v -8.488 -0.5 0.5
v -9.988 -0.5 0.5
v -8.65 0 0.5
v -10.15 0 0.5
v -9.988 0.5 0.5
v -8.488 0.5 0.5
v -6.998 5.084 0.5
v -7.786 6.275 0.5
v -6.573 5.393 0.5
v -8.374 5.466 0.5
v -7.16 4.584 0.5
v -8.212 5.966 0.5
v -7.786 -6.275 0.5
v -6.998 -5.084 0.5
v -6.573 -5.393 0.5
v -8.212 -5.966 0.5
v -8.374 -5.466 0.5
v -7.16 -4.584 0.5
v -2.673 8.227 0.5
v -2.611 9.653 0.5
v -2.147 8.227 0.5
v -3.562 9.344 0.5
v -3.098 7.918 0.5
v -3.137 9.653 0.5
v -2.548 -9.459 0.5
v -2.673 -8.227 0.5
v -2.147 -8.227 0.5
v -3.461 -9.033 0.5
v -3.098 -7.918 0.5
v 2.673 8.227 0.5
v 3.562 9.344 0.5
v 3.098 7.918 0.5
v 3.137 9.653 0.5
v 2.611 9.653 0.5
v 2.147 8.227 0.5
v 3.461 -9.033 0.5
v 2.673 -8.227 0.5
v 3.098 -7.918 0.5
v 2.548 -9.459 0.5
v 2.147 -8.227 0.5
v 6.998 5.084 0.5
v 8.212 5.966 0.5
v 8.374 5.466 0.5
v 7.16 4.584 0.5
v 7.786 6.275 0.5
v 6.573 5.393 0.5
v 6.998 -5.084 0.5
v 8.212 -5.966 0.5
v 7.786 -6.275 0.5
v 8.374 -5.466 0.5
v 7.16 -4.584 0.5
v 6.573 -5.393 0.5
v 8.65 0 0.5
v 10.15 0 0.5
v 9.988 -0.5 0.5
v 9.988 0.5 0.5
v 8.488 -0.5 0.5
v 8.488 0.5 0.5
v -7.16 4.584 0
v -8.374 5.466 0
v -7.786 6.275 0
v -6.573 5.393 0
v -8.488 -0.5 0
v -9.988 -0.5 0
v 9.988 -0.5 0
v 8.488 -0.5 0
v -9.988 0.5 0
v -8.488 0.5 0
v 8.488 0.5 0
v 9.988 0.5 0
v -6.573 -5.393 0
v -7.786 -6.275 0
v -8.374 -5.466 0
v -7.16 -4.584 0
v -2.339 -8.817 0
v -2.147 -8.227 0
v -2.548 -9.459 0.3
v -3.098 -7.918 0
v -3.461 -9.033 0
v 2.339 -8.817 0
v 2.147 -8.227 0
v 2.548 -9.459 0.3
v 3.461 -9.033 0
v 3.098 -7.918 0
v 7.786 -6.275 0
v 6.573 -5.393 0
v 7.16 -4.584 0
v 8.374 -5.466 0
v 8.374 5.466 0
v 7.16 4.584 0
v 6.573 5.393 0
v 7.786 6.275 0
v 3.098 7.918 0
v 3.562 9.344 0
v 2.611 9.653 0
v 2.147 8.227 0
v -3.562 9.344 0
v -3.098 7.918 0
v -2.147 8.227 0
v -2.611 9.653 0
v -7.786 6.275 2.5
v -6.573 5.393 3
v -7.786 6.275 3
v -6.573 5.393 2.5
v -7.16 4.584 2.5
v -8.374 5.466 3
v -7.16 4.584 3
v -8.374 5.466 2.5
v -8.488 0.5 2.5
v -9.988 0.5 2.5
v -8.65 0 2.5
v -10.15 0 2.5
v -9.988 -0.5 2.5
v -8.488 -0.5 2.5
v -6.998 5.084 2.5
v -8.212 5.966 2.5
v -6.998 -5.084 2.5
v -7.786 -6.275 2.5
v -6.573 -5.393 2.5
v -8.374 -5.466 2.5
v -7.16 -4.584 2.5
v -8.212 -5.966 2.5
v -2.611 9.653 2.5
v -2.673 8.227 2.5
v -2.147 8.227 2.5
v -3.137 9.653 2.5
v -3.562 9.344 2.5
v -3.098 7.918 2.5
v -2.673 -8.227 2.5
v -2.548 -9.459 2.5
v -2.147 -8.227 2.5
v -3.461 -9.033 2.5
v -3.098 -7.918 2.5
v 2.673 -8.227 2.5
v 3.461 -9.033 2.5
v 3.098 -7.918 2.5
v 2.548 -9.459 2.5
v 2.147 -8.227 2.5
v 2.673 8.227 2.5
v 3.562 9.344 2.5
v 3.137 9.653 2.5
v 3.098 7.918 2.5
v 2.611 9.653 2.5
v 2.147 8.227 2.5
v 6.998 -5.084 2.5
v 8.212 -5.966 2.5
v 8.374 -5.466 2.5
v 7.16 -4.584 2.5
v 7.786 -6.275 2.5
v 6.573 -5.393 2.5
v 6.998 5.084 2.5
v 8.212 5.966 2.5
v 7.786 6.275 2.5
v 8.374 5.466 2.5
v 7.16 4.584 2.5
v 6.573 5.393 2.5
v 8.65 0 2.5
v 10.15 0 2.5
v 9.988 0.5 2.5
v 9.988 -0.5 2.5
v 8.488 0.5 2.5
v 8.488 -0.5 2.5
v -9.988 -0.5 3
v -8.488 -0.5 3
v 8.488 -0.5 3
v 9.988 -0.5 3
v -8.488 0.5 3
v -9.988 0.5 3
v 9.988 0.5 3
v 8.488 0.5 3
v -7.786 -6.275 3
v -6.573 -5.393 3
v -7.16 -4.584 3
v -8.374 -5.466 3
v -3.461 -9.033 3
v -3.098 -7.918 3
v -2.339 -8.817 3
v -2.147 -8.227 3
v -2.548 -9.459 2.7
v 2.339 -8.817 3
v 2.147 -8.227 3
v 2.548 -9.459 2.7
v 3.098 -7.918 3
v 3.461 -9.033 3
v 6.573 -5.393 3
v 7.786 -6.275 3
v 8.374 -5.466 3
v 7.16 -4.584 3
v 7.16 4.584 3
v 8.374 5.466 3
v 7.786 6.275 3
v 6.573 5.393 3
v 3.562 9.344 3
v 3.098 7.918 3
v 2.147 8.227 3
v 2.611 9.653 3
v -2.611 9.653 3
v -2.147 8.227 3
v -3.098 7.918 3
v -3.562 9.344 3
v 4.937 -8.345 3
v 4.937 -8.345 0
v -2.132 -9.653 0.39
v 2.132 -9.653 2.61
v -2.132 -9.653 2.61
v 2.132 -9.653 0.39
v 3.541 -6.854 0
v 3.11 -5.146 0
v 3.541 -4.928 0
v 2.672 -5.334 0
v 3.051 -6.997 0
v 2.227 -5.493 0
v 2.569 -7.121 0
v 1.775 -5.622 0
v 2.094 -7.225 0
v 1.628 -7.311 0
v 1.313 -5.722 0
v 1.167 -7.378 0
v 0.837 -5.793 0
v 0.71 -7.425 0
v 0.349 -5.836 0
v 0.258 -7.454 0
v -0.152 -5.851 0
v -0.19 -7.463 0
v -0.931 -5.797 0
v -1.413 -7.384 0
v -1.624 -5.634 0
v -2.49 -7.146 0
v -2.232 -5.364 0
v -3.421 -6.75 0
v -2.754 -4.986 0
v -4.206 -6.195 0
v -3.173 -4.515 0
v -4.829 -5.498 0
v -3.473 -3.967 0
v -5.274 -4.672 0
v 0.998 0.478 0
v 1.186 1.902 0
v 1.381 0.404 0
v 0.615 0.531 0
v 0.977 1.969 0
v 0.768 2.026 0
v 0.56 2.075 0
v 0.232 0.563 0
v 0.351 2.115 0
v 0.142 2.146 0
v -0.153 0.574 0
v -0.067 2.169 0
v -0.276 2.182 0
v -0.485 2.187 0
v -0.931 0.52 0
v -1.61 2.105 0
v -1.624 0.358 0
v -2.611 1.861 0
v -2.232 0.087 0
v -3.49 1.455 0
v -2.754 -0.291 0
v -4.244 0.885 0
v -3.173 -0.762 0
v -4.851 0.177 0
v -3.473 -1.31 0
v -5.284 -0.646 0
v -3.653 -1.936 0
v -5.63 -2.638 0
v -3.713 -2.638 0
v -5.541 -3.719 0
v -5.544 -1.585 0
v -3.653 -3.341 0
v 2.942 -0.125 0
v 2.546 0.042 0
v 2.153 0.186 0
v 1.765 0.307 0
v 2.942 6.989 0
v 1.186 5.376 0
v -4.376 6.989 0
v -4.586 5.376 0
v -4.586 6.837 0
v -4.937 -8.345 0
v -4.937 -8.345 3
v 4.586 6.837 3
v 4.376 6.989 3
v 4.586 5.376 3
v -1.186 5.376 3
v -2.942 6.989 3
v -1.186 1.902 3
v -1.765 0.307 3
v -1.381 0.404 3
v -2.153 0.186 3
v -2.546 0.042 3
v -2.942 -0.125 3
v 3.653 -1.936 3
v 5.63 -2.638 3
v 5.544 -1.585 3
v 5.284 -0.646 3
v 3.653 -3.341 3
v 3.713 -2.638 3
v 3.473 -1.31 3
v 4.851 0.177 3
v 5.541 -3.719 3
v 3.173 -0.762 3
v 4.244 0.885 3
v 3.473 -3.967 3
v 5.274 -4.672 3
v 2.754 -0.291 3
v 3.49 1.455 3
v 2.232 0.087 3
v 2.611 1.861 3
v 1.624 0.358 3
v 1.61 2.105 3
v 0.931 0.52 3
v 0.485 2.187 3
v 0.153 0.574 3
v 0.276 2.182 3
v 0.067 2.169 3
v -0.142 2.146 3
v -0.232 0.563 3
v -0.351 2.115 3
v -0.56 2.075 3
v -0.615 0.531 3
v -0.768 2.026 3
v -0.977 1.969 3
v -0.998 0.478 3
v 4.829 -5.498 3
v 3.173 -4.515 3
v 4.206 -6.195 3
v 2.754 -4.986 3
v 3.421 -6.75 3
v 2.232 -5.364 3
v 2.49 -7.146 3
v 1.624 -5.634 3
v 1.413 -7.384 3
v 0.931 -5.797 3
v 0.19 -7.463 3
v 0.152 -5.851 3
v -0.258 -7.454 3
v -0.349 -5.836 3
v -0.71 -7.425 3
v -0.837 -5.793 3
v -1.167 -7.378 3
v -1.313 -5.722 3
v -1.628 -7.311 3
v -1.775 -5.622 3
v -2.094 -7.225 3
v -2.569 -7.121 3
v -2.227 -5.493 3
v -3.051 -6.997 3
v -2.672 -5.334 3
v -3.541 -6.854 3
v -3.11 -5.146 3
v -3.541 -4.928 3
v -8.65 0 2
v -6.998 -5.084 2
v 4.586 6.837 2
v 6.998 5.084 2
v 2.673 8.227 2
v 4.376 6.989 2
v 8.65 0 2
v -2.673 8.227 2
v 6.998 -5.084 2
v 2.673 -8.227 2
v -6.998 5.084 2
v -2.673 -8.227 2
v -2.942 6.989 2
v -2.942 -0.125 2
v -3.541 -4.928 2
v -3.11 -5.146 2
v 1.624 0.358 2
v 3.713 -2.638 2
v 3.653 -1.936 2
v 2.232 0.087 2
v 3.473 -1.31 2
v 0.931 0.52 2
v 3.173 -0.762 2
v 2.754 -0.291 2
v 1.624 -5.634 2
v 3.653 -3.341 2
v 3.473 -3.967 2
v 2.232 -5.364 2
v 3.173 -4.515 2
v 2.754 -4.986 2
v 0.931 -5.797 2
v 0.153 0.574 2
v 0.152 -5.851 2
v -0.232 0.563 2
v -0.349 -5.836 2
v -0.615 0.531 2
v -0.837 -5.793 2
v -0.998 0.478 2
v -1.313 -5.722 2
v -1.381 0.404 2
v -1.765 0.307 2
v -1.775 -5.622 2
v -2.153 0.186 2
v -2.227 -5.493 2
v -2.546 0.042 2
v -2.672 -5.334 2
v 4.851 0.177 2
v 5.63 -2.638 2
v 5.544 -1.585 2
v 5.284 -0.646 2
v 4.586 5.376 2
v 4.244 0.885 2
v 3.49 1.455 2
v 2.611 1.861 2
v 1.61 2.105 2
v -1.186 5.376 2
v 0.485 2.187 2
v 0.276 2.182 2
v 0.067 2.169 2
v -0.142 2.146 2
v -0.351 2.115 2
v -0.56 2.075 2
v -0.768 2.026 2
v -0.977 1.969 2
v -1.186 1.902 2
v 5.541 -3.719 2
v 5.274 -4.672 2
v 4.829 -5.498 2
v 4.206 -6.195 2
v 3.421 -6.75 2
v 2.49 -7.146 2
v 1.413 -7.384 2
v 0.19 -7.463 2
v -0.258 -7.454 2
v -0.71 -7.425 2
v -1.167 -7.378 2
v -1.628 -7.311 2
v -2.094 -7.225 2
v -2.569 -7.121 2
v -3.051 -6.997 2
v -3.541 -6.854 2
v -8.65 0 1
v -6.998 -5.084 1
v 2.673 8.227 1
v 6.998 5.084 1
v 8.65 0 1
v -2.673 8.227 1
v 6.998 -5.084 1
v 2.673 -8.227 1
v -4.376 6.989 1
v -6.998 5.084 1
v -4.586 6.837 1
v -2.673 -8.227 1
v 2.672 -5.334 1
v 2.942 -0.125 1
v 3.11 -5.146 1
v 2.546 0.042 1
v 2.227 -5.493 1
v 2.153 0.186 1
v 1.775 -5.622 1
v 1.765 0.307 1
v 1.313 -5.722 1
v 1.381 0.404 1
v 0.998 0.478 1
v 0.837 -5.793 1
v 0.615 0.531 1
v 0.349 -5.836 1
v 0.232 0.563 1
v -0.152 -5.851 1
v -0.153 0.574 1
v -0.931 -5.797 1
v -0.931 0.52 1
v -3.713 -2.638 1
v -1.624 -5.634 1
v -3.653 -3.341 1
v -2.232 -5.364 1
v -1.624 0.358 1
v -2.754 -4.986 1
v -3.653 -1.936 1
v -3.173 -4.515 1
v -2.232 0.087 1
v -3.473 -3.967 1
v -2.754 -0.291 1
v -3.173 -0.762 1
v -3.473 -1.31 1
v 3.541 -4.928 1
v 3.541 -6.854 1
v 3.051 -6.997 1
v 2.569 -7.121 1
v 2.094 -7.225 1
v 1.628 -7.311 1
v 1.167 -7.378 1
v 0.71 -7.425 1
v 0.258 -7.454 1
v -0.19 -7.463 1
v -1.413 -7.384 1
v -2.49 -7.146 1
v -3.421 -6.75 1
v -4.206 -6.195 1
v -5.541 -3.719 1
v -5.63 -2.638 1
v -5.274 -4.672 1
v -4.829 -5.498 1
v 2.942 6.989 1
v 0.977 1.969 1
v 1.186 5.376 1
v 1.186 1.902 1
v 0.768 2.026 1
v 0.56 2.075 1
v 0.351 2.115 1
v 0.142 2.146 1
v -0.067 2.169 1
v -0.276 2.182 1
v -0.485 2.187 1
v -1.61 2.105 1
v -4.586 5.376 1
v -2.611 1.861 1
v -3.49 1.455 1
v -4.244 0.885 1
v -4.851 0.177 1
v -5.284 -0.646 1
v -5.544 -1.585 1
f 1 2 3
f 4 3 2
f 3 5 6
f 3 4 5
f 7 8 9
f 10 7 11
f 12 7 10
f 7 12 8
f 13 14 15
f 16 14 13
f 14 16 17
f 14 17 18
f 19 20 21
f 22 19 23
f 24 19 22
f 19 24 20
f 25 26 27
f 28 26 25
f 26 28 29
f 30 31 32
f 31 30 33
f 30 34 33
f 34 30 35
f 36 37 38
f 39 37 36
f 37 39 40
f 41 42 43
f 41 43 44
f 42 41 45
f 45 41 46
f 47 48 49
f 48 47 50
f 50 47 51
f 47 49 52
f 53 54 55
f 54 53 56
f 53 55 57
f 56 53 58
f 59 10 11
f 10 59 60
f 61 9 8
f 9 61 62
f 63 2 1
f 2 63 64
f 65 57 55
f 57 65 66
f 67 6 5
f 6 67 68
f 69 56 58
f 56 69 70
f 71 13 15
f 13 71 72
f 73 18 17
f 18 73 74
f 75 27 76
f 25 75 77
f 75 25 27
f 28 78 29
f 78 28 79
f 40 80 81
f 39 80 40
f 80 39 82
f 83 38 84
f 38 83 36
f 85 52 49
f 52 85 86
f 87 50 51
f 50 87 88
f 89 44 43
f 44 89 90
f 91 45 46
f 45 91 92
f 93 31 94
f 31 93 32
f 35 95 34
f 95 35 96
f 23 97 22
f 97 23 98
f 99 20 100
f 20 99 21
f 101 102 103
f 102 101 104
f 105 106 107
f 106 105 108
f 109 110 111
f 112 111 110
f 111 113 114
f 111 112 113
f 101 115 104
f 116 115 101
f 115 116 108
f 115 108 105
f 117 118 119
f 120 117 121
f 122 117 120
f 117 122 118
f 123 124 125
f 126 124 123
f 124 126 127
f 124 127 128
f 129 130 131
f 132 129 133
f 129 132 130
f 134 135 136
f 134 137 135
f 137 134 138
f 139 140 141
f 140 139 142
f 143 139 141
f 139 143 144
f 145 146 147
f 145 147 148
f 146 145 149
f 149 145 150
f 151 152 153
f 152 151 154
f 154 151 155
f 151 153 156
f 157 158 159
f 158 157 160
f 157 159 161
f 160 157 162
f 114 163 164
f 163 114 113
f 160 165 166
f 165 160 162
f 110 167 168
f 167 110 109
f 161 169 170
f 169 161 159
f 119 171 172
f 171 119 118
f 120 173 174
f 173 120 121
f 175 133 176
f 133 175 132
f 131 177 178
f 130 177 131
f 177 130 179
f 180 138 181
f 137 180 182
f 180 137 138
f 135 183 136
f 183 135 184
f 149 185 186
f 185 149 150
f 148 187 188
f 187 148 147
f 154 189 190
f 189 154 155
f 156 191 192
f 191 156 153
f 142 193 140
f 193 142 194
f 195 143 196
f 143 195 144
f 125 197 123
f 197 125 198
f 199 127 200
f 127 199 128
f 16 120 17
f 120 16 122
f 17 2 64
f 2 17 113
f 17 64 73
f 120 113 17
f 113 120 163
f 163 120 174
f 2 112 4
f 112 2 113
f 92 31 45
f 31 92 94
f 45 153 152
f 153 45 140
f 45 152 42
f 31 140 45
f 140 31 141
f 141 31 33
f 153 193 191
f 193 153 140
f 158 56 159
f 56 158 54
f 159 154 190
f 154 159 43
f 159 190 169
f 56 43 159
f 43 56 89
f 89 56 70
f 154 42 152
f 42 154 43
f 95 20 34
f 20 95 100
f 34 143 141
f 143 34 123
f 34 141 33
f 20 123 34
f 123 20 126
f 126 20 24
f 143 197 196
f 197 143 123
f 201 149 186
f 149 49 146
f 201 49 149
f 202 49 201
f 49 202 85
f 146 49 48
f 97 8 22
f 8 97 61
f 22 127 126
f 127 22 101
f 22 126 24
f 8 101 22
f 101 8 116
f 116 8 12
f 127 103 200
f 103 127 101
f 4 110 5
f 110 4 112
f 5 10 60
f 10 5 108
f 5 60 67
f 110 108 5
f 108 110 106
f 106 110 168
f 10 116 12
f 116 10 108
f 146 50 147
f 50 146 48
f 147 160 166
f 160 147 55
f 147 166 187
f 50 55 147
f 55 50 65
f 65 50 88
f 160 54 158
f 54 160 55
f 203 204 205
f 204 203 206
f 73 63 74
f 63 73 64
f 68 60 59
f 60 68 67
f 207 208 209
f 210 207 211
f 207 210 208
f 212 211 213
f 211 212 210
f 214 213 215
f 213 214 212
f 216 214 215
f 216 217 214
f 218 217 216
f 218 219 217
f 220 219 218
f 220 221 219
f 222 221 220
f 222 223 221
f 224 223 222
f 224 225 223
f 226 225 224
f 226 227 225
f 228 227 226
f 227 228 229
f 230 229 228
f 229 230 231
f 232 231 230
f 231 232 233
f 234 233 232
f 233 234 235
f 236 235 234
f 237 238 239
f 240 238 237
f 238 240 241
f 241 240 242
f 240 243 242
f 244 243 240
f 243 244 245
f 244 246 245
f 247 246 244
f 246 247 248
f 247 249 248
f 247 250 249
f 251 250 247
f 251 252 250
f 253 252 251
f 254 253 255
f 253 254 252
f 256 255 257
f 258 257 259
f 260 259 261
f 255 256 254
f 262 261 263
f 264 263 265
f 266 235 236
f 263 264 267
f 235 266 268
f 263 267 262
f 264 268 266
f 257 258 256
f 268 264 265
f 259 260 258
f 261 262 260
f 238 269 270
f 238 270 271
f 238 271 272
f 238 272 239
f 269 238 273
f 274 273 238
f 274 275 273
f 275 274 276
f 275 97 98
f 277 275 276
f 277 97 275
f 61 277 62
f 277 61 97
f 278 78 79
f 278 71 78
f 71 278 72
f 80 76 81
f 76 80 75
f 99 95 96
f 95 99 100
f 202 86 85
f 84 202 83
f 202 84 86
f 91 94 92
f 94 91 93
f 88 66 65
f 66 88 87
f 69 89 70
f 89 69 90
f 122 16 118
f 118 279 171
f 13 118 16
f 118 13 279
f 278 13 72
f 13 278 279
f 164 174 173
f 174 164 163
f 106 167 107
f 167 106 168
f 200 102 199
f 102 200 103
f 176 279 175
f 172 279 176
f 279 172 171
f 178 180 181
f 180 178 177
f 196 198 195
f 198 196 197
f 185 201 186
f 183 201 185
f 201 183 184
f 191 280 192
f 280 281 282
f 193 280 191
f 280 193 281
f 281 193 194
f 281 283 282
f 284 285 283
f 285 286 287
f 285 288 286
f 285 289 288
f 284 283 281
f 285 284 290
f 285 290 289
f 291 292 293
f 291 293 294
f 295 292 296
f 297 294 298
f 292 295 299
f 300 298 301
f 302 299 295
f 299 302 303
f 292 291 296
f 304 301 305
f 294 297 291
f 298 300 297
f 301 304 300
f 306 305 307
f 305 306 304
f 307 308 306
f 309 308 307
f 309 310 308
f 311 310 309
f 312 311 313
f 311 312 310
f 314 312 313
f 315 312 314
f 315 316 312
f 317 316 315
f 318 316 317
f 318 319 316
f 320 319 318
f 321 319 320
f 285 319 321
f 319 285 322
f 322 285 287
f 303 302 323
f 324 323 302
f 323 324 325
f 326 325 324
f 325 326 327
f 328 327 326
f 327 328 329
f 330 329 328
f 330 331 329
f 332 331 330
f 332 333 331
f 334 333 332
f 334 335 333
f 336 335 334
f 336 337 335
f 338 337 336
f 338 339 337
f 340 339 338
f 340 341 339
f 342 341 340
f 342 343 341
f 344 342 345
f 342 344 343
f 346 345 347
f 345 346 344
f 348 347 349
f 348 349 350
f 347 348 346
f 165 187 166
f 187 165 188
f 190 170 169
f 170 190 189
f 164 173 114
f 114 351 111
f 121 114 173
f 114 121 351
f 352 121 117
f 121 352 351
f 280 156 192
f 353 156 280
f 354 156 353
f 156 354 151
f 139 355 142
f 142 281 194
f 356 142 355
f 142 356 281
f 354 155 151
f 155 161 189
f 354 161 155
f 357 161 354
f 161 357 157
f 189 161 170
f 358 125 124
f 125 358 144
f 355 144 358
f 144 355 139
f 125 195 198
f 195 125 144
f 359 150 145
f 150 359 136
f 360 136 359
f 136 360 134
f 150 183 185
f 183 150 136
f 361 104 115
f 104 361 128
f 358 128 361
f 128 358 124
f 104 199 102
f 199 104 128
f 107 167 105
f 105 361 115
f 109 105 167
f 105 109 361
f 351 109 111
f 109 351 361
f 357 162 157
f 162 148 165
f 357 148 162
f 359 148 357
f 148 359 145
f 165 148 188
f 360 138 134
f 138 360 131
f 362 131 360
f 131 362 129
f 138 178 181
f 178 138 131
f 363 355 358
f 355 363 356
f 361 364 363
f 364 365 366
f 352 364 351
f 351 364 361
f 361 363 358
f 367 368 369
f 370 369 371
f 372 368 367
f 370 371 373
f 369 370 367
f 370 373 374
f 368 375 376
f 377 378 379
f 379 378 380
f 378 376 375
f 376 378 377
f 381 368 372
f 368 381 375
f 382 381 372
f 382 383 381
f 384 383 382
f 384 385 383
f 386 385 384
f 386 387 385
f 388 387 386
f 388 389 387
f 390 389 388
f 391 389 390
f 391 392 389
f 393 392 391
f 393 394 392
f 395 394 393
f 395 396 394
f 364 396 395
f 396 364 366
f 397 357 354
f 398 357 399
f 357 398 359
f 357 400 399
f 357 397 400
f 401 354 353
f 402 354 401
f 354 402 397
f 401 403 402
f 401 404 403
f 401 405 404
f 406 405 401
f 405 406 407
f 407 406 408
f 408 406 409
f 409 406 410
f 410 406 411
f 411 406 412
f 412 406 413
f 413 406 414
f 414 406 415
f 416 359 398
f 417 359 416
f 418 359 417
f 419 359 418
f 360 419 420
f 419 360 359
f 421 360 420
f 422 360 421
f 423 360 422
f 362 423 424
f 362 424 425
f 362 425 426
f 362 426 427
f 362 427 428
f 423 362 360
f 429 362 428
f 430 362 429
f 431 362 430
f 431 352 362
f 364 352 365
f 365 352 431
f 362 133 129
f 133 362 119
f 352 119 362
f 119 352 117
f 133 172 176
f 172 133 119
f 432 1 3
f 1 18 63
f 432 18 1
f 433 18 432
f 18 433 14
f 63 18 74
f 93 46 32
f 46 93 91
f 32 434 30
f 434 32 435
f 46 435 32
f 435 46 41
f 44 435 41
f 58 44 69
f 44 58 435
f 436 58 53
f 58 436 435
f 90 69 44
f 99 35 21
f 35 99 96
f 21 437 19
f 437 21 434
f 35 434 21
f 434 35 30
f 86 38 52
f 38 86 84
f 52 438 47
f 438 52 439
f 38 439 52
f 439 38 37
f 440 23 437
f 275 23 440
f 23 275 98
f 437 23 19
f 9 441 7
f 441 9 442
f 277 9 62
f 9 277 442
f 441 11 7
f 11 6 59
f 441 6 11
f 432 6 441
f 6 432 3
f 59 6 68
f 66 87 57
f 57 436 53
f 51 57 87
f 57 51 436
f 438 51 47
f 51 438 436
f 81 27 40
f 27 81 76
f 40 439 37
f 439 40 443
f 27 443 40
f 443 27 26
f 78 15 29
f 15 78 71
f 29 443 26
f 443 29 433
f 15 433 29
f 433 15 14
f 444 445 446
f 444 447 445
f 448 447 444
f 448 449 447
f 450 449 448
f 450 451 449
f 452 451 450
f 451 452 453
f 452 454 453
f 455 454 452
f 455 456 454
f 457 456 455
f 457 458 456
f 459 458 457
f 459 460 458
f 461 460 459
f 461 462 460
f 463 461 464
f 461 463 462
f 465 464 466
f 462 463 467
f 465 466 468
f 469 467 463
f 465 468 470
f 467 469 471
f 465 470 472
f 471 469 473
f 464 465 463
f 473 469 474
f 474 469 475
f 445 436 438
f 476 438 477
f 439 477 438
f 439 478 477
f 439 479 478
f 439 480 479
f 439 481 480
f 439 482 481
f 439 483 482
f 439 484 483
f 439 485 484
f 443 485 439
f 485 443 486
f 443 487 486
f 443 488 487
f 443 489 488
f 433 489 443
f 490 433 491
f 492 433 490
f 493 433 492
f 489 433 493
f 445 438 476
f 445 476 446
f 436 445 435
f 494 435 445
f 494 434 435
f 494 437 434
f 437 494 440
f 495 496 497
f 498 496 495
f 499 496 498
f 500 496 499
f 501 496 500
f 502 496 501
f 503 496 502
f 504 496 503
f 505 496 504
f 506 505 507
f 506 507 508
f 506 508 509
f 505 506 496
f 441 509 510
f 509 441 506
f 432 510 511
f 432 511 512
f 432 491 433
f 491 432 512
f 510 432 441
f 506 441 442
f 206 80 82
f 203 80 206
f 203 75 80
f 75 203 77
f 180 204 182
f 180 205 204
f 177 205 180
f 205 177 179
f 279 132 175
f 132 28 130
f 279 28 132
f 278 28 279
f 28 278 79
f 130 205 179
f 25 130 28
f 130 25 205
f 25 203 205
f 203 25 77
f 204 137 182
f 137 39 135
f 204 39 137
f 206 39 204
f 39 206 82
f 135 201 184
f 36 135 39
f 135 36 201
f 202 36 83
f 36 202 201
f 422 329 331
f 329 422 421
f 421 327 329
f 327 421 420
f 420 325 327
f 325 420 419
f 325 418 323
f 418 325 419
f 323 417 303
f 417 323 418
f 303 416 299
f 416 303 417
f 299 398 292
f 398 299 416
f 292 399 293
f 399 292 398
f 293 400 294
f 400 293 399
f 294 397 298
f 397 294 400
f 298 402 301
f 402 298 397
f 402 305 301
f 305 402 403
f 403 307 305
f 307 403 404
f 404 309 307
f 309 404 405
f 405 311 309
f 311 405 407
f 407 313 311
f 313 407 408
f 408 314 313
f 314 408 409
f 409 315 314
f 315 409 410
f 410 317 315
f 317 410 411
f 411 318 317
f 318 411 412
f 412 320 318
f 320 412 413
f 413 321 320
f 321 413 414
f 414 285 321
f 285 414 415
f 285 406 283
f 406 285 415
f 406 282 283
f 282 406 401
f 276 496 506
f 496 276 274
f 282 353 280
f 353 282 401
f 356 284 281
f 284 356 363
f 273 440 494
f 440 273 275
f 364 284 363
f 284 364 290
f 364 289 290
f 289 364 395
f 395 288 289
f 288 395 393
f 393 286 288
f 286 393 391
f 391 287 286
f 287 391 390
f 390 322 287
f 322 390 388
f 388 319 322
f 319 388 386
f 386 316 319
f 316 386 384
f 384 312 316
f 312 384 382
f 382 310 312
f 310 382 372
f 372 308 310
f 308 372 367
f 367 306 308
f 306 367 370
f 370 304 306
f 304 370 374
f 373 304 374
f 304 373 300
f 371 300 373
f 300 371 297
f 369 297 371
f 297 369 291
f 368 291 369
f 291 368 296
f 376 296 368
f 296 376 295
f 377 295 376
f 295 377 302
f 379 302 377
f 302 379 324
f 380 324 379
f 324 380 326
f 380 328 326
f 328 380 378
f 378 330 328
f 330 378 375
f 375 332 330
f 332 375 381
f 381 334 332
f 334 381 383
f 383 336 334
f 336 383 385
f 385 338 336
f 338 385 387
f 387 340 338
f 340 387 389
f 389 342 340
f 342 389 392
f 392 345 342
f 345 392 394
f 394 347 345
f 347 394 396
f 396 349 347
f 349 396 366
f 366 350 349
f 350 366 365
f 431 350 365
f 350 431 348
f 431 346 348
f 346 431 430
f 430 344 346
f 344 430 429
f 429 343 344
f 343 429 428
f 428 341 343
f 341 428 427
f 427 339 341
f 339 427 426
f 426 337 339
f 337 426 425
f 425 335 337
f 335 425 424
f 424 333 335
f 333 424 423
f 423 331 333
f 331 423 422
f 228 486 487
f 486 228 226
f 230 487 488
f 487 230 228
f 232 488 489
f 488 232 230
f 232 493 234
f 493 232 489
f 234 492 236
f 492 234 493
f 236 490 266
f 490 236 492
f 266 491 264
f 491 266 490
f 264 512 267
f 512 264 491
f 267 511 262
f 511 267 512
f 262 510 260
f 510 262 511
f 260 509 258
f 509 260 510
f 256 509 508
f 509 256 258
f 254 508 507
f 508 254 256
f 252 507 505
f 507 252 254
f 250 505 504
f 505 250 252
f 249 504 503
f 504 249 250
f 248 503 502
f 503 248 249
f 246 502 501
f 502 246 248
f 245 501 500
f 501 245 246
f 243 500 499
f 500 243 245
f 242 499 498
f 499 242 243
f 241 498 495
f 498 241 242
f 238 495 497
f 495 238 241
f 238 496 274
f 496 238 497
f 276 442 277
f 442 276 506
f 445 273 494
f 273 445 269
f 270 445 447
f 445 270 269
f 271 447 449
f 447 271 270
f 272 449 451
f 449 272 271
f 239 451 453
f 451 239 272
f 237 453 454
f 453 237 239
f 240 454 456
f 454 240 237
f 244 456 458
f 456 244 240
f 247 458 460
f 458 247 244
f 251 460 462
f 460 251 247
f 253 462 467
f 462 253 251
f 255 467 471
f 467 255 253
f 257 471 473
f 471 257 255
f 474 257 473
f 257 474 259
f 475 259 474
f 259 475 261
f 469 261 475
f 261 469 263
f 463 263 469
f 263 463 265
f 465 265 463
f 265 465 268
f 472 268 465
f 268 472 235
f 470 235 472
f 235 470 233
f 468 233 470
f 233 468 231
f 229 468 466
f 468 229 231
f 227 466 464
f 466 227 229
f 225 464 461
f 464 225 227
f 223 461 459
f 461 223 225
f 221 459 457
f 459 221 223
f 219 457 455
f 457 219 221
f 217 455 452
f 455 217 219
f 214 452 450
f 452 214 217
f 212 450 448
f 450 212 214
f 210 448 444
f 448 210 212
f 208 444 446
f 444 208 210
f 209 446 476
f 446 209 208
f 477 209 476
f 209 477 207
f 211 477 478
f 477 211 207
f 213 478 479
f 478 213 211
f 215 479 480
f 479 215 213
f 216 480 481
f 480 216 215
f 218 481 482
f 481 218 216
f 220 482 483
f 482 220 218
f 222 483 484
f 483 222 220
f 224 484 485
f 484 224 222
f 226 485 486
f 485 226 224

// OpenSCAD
H = 3;
R = 10.15;

translate([1, -0.4, H - 1.5])
  linear_extrude(1.5)
    text("5",size=14,font="Anironc",halign="center",valign="center");

translate([-1, -0.4, 1.5])
  rotate([0, 180, 0])
    linear_extrude(1.5)
      text("5",size=14,font="Anironc",halign="center",valign="center");

difference() {
  rotate([0, 0, 0])
    cylinder(r=R, h=H, $fn=10);

  translate([0, 0, H - 1])
    cylinder(r=R-1.5, h=H, $fn=10);

  translate([0, 0, -1])
    cylinder(r=R-1.5, h=2, $fn=10);

  for ( i = [9 : 360 / 10 : 360] ){
    rotate([0, 0, i + 45])
      translate([0, 5, 0])
          cube(size = [1, 20, 1], center = true);
  }

  for ( i = [9 : 360 / 10 : 360] ){
    rotate([0, 0, i + 45])
      translate([0, 5, H])
          cube(size = [1, 20, 1], center = true);
  }

  translate([0, -10, 0])
    rotate([65, 0, 0])
      cube(size = [6, 1, 5], center = true);

  translate([0, -10, H])
    rotate([-65, 0, 0])
      cube(size = [6, 1, 5], center = true);

  translate([-3, -9.8, 2])
    rotate([25, 90, 0])
      cube(size = [6, 1, 5], center = true);

  translate([3, -9.8, 2])
    rotate([25, 270, 0])
      cube(size = [6, 1, 5], center = true);
}
